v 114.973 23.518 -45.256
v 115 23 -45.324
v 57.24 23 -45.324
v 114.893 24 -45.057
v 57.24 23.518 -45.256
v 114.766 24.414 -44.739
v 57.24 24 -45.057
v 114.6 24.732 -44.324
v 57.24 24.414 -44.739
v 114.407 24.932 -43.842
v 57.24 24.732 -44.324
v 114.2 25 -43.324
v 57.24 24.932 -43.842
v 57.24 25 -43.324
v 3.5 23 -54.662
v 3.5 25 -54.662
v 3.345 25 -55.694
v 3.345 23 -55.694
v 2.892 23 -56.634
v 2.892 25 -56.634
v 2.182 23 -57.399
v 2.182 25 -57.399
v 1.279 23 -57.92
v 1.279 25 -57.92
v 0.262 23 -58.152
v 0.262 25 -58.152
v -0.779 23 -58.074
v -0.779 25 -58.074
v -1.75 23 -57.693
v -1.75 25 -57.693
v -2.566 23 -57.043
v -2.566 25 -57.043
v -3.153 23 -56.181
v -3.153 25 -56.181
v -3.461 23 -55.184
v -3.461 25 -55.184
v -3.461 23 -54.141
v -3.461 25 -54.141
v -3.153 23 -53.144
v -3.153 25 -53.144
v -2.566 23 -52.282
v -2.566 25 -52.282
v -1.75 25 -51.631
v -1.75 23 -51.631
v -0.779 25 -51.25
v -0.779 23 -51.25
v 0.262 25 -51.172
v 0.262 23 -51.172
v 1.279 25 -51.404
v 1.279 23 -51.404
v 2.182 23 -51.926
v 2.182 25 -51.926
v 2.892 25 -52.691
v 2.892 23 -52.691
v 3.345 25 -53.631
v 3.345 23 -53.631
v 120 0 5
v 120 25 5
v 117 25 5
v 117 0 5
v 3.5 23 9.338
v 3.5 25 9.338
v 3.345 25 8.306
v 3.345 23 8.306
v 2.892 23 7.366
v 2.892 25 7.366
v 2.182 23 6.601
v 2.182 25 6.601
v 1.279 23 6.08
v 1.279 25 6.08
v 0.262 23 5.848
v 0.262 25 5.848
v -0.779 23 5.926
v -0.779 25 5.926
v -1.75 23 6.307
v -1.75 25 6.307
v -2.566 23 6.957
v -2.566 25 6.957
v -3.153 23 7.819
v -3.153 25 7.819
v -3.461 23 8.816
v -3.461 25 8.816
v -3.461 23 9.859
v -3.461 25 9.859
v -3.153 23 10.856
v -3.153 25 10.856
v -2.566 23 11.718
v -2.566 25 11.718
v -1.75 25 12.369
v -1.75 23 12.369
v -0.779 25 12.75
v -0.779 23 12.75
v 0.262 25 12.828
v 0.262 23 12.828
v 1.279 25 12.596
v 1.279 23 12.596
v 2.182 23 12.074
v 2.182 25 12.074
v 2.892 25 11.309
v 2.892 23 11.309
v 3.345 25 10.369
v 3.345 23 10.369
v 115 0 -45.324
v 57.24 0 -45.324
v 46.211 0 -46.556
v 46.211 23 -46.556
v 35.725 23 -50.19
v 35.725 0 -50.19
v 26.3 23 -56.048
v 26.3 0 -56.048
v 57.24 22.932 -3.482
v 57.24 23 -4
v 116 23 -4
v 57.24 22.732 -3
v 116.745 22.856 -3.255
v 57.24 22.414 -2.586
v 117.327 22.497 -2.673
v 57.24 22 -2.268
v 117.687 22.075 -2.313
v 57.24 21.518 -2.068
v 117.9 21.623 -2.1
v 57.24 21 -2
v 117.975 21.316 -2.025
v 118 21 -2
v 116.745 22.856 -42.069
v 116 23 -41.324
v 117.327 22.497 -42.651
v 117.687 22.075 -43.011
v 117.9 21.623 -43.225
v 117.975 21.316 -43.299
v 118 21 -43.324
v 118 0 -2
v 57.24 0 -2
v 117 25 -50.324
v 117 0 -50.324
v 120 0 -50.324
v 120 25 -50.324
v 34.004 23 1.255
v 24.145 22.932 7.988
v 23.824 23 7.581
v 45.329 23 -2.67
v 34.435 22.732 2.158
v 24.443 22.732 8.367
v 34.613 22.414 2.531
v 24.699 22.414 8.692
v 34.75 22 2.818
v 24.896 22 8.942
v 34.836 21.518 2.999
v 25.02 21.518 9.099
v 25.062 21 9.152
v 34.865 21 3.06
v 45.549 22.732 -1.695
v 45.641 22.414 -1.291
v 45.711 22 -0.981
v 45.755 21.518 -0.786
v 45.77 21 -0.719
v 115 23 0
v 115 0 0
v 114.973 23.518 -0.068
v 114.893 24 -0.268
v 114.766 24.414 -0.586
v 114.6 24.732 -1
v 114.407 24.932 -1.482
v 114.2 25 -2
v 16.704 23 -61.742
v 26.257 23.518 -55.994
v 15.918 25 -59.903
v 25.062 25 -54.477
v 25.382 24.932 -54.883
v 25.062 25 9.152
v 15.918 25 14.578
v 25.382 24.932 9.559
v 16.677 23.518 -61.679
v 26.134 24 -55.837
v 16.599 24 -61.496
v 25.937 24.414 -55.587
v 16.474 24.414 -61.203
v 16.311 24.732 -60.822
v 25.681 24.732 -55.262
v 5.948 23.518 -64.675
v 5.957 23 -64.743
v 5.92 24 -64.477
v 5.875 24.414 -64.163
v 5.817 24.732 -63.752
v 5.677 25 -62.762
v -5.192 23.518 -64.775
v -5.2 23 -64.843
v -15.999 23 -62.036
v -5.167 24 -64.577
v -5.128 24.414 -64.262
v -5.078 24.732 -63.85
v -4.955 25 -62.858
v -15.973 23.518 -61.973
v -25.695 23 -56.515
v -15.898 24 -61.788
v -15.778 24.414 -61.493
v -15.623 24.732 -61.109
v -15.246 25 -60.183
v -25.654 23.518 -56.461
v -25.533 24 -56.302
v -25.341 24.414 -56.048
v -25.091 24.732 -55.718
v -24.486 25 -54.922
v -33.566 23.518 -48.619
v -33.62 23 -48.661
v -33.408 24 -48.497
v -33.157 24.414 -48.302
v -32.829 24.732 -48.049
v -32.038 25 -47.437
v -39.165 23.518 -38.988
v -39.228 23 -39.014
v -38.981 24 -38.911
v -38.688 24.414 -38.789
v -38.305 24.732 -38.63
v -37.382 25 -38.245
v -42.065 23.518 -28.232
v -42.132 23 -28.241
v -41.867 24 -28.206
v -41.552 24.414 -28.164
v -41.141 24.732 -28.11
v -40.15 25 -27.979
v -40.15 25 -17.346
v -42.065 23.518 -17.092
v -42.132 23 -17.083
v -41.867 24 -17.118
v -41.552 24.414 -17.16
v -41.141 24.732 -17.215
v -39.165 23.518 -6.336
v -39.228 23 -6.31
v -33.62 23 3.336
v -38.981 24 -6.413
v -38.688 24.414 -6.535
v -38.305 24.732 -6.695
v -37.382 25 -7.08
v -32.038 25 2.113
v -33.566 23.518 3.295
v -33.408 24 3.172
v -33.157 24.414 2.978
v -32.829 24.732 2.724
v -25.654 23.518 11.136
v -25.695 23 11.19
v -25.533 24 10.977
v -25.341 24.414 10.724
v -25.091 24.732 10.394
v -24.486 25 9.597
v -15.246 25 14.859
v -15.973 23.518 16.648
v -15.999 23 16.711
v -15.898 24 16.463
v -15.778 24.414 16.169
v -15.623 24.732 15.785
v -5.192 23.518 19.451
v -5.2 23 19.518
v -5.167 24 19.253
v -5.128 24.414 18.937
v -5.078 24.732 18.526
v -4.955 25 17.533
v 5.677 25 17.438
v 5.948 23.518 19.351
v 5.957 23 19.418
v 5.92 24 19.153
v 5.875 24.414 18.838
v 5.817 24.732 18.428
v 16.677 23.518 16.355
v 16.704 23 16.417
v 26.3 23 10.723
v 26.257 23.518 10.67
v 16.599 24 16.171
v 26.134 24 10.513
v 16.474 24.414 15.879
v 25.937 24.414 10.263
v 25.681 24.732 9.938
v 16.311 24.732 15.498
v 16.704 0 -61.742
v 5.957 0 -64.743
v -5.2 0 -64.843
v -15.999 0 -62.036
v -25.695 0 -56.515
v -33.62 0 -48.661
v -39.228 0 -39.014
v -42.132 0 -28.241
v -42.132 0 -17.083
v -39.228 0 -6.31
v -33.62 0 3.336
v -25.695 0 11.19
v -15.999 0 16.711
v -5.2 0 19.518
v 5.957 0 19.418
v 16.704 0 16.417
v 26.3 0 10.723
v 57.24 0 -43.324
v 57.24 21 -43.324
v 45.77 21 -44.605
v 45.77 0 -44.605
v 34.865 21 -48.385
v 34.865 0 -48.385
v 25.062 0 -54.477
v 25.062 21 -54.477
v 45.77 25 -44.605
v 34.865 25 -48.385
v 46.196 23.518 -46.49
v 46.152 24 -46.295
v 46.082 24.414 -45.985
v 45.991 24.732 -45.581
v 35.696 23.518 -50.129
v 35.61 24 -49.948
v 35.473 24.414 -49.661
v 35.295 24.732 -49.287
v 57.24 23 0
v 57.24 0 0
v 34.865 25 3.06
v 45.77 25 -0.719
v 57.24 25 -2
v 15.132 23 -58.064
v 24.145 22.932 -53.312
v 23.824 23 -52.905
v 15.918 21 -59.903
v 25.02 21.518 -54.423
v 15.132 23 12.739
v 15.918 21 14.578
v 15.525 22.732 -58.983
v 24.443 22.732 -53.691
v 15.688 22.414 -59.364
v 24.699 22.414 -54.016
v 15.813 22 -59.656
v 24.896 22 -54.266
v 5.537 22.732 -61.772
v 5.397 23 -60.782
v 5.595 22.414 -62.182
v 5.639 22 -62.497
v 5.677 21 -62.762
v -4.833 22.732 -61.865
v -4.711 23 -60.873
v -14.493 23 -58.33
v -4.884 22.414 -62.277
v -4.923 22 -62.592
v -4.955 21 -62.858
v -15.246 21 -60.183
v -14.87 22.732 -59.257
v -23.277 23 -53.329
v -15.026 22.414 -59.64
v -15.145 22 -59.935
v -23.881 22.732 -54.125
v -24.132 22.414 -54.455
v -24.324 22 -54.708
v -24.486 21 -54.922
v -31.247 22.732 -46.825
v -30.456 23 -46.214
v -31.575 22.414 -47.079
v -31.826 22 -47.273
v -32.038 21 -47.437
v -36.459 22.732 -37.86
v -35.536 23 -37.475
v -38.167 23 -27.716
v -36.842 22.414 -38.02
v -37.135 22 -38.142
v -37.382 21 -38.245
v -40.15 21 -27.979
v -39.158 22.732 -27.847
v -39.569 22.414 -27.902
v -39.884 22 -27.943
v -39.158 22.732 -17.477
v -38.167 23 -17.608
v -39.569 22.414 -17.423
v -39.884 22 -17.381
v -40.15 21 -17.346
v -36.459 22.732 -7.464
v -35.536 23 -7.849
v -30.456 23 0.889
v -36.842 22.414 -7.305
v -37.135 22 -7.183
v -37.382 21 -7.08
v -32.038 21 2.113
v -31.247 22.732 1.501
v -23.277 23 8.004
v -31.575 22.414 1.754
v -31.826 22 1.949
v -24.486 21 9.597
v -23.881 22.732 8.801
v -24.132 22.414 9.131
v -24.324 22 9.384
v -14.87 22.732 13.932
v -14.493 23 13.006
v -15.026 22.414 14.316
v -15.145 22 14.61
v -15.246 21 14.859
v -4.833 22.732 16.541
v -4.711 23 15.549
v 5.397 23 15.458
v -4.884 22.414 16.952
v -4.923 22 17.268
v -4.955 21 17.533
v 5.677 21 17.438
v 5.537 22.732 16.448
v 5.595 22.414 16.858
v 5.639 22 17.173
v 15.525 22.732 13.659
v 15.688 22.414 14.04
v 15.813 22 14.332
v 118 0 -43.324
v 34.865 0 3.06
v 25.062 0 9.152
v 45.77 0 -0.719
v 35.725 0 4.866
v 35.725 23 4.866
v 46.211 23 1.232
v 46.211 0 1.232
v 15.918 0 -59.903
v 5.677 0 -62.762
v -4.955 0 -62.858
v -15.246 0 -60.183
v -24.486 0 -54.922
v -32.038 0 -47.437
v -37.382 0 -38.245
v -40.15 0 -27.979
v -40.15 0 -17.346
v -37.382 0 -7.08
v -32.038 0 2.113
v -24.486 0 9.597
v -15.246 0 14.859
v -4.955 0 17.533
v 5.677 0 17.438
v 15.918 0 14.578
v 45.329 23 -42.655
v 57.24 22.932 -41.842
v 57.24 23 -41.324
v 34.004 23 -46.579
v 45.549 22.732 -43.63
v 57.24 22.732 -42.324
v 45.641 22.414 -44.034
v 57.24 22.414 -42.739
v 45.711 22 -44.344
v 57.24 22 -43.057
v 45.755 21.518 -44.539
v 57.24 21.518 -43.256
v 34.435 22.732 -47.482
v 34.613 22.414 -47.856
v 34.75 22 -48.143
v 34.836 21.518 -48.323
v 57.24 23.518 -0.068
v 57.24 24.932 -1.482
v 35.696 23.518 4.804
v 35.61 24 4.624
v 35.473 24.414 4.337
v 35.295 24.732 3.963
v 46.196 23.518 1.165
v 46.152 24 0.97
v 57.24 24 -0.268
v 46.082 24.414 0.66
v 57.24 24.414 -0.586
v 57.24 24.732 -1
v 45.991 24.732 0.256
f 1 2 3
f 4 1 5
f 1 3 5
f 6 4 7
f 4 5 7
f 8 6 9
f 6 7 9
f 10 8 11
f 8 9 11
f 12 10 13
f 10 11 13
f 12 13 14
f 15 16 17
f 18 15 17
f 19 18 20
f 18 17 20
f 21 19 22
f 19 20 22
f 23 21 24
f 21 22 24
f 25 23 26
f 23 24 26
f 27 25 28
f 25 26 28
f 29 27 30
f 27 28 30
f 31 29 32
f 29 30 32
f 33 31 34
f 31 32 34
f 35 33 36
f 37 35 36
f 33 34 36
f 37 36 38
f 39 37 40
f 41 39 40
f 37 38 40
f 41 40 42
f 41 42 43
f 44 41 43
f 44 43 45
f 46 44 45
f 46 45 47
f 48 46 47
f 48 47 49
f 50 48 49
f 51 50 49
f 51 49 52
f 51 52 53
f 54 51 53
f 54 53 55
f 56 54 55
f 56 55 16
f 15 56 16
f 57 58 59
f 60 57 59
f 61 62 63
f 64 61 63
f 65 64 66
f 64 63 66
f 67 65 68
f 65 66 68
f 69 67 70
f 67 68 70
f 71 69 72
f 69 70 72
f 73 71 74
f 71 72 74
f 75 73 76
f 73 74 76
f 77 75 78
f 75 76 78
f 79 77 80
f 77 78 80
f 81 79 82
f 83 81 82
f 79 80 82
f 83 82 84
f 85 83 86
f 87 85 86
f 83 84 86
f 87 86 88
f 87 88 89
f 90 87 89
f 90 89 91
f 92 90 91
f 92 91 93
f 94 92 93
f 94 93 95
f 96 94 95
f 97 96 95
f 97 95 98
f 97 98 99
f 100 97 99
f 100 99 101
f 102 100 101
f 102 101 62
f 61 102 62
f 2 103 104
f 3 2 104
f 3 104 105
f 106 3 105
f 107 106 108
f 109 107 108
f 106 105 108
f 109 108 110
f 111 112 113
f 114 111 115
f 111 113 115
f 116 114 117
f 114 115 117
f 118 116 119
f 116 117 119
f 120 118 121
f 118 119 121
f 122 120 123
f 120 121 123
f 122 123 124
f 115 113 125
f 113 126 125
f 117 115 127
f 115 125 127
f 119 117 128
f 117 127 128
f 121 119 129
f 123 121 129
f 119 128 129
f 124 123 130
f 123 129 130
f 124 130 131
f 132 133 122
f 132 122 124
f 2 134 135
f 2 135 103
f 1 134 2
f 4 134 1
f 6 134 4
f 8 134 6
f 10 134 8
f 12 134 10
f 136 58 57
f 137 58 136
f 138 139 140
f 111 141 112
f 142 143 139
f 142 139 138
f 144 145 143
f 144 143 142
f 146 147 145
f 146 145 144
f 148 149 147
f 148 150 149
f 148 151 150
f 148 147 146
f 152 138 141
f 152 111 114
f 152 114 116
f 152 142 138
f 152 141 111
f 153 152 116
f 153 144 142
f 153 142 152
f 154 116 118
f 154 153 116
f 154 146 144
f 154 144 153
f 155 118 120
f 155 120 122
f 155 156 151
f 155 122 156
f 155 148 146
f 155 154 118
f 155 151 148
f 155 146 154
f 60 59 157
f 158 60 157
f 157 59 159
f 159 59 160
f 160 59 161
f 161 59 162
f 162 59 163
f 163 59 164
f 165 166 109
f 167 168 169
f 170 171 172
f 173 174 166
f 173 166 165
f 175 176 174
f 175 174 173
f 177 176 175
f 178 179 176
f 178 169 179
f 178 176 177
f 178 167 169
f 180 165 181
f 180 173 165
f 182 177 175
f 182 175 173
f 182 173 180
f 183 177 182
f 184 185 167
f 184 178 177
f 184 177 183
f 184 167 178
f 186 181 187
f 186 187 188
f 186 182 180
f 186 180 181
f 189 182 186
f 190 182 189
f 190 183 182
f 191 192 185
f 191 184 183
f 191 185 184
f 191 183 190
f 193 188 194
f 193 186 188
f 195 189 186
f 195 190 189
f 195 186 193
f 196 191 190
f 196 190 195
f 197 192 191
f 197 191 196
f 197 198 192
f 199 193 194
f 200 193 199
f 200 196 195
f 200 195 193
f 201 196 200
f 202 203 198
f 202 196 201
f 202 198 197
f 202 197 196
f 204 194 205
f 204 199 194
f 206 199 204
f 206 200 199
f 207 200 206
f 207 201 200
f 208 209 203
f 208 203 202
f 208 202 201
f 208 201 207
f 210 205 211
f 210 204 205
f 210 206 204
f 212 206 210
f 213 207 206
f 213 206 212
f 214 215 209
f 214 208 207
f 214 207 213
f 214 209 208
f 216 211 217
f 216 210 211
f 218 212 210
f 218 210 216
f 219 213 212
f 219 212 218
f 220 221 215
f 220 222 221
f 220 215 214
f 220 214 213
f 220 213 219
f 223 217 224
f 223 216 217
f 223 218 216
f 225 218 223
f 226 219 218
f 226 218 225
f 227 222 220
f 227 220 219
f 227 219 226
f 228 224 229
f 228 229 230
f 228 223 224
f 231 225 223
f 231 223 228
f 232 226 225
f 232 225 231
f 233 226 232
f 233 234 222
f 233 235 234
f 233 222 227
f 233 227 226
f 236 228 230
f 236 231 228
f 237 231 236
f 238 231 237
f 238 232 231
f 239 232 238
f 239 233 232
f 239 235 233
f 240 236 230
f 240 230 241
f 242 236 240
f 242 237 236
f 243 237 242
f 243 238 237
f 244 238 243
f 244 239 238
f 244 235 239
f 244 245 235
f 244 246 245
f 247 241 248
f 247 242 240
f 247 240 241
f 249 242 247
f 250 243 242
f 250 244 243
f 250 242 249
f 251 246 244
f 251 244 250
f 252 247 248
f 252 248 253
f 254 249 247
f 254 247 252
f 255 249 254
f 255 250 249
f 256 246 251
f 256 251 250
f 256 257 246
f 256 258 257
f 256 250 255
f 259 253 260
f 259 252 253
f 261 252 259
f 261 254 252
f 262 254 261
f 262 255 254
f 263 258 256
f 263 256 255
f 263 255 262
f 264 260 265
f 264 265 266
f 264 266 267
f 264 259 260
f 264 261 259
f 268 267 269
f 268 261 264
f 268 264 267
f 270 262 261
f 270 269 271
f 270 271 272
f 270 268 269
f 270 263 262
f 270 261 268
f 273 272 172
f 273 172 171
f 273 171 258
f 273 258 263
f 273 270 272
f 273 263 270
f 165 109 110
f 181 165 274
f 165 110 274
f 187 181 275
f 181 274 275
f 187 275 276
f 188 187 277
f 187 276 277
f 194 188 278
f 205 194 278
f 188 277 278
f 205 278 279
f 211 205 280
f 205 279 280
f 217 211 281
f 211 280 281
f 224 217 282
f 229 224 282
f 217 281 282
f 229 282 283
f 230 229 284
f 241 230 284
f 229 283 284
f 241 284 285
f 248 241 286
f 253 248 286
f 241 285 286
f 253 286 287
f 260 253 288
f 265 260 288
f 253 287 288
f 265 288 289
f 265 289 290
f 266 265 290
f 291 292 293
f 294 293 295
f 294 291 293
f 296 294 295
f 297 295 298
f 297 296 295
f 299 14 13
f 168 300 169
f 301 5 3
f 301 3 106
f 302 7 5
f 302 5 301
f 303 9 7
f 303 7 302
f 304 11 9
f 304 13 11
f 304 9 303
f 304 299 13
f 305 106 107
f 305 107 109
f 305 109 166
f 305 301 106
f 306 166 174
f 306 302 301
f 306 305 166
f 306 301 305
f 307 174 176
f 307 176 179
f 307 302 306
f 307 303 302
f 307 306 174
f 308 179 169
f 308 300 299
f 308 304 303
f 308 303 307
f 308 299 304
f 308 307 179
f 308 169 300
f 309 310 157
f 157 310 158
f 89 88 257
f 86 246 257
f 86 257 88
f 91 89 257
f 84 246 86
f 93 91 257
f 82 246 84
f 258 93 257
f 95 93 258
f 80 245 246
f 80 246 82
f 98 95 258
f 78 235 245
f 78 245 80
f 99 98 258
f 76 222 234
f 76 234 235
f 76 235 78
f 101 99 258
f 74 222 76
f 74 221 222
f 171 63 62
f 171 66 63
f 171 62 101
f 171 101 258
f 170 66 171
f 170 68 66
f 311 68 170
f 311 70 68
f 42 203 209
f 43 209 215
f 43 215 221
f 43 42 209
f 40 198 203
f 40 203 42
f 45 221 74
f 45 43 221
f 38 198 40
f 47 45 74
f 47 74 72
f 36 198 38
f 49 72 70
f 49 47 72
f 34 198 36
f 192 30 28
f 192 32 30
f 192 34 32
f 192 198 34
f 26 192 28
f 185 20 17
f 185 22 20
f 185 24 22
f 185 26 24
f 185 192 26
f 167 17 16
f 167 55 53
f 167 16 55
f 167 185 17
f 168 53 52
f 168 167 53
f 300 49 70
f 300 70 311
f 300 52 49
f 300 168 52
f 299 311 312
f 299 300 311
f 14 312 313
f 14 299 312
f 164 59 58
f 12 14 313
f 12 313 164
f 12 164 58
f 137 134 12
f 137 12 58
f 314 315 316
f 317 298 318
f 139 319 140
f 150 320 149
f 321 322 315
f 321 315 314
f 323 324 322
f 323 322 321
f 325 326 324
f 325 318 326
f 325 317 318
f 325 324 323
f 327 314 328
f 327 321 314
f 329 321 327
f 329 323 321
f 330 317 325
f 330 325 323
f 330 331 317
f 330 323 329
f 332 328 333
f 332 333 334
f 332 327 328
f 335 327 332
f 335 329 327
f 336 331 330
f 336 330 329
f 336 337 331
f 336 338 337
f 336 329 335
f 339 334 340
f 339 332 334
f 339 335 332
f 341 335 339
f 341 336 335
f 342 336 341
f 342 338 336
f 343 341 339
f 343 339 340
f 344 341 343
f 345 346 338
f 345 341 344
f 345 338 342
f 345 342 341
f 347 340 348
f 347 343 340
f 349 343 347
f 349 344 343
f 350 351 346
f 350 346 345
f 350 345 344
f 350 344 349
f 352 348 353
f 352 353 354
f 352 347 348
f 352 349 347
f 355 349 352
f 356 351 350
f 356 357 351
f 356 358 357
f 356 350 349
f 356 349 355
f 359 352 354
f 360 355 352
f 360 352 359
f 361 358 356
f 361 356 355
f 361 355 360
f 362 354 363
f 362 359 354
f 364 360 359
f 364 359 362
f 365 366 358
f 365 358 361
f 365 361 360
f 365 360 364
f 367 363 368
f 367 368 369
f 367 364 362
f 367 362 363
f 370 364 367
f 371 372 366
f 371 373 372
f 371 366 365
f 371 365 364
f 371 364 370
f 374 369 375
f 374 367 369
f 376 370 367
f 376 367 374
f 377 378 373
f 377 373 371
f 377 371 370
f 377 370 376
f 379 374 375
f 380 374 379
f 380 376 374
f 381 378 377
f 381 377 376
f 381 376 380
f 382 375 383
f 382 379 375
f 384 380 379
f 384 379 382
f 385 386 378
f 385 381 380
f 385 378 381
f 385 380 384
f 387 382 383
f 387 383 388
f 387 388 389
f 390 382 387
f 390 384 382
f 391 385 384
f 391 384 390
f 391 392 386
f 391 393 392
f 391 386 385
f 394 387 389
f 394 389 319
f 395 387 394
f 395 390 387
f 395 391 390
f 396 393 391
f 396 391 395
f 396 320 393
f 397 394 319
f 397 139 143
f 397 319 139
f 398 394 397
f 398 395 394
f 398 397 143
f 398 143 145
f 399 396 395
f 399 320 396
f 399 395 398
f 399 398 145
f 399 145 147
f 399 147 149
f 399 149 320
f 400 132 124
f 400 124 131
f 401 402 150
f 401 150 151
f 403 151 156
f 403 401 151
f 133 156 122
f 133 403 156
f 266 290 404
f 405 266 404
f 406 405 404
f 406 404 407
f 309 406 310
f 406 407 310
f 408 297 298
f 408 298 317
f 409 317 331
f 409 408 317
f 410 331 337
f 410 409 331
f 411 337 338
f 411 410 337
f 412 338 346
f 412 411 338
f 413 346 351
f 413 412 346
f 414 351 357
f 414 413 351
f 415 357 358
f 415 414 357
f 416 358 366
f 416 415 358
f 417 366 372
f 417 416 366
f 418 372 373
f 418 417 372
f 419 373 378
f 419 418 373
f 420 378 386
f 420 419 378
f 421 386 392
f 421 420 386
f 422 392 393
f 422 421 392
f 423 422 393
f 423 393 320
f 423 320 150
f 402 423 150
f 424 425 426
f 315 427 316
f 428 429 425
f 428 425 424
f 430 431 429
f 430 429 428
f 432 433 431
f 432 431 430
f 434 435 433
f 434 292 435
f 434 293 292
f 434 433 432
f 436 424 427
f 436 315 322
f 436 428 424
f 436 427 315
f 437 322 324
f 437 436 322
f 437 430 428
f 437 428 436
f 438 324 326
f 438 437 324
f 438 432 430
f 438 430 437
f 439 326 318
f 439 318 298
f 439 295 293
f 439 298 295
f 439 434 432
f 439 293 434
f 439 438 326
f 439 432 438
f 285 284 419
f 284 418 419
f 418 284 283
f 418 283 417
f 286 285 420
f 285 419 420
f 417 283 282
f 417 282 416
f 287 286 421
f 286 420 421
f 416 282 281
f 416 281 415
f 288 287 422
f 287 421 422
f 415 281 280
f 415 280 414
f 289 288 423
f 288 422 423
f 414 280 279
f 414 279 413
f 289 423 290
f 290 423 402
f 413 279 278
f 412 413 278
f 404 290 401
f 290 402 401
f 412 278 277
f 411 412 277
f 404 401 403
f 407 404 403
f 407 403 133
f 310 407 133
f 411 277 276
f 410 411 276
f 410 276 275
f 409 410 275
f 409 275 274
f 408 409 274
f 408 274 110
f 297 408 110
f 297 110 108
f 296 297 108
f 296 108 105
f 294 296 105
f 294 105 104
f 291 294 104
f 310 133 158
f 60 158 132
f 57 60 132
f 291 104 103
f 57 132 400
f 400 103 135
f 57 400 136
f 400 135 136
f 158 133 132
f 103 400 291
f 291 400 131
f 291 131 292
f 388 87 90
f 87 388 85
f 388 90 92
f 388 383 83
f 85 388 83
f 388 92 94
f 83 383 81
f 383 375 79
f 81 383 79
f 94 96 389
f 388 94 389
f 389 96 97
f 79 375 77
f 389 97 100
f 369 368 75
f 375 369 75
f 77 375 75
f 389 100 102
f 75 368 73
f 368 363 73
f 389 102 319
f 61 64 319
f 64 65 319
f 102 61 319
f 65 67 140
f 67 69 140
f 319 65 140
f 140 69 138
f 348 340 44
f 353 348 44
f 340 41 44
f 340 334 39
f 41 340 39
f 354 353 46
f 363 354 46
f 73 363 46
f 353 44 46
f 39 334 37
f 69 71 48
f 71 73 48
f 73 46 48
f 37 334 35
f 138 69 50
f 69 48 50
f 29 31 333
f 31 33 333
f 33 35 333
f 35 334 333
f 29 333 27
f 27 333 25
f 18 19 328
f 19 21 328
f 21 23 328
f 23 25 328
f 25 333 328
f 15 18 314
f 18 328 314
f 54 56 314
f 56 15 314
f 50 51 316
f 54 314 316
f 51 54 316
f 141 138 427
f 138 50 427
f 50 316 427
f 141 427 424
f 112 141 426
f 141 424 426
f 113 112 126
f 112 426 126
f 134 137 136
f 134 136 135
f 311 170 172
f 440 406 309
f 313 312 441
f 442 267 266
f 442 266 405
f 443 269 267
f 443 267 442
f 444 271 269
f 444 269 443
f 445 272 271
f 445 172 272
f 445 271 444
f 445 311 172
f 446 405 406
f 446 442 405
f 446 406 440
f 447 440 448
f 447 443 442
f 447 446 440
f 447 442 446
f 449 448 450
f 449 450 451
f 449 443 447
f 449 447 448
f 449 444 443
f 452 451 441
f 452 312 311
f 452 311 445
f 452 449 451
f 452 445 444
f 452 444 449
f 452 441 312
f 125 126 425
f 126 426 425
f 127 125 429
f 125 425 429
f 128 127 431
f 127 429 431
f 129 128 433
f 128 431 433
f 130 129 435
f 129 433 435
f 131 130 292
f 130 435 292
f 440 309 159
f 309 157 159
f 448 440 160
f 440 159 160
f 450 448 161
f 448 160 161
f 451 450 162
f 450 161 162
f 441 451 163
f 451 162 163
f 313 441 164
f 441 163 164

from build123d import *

# Parameters (mm, degrees)
SALIENTE_EXTRUIR1_DEPTH = 25
VACIADO1_T              = -2
CORTAR_EXTRUIR1_REACH   = 27
CROQUIS3_R              = 3.5
SALIENTE_EXTRUIR2_DEPTH = 25
REDONDEO1_R             = 2
REDONDEO2_R             = 2


with BuildPart() as part:
    # Croquis1 → Saliente-Extruir1 (new body)
    with BuildSketch(Plane(origin=(0, 0, 0), x_dir=(1, 0, 0), z_dir=(0, 1, 0))):
        with BuildLine():
            Line((57.240287673, 0), (120, 0))
            Line((120, 0), (120, 45.324457228))
            Line((120, 45.324457228), (57.240287673, 45.324457228))
            ThreePointArc((57.240287673, 45.324457228), (40.867200252, 48.081235404), (26.299591633, 56.047576896))
            ThreePointArc((26.299591633, 56.047576896), (-42.5, 22.662228614), (26.299591633, -10.723119668))
            ThreePointArc((26.299591633, -10.723119668), (40.867200252, -2.756778176), (57.240287673, 0))
        make_face()
    extrude(amount=SALIENTE_EXTRUIR1_DEPTH)

    # Vaciado1
    vaciado1_openings = [part.faces().sort_by_distance(p)[0] for p in [
        (56.079114696, 0, -22.662228614),
    ]]
    offset(amount=VACIADO1_T, openings=vaciado1_openings, kind=Kind.INTERSECTION)

    # Croquis3 → Cortar-Extruir1 (cut, up to next)
    with BuildSketch(Plane(origin=(0, 25, 0), x_dir=(1, 0, 0), z_dir=(0, 1, 0)), mode=Mode.PRIVATE) as cortar_extruir1_sk1:
        with Locations((0, 54.662228614)):
            Circle(CROQUIS3_R)
    cortar_extruir1_tool1 = extrude(cortar_extruir1_sk1.sketch, amount=-CORTAR_EXTRUIR1_REACH, mode=Mode.PRIVATE) & part.part
    add(cortar_extruir1_tool1.solids().sort_by_distance((0, 25, -54.662229))[0], mode=Mode.SUBTRACT)
    # Croquis3 → Cortar-Extruir1 (cut, up to next)
    with BuildSketch(Plane(origin=(0, 25, 0), x_dir=(1, 0, 0), z_dir=(0, 1, 0)), mode=Mode.PRIVATE) as cortar_extruir1_sk2:
        with Locations((0, -9.337771386)):
            Circle(CROQUIS3_R)
    cortar_extruir1_tool2 = extrude(cortar_extruir1_sk2.sketch, amount=-CORTAR_EXTRUIR1_REACH, mode=Mode.PRIVATE) & part.part
    add(cortar_extruir1_tool2.solids().sort_by_distance((0, 25, 9.337771))[0], mode=Mode.SUBTRACT)

    # Croquis4 → Saliente-Extruir2 (add)
    with BuildSketch(Plane(origin=(0, 25, 0), x_dir=(1, 0, 0), z_dir=(0, 1, 0))):
        Polygon((120, 45.324457228), (120, 50.324457228), (117, 50.324457228), (115, 45.324457228), align=None)
        Polygon((115, 0), (120, 0), (120, -5), (117, -5), align=None)
    extrude(amount=-SALIENTE_EXTRUIR2_DEPTH)

    # Redondeo1
    redondeo1_edges = [part.edges().sort_by_distance(p)[0] for p in [
        (40.867200252, 25, 2.756778176),
        (86.120143836, 25, 0),
        (40.867200252, 25, -48.081235404),
        (86.120143836, 25, -45.324457228),
        (-42.5, 25, -22.662228614),
    ]]
    fillet(redondeo1_edges, radius=REDONDEO1_R)

    # Redondeo2
    redondeo2_edges = [part.edges().sort_by_distance(p)[0] for p in [
        (40.212276755, 23, -46.191506531),
        (-40.5, 23, -22.662228614),
        (40.212276755, 23, 0.867049303),
        (87.620143836, 23, -2),
        (118, 23, -22.662228614),
        (87.620143836, 23, -43.324457228),
    ]]
    fillet(redondeo2_edges, radius=REDONDEO2_R)


solid = part.part
